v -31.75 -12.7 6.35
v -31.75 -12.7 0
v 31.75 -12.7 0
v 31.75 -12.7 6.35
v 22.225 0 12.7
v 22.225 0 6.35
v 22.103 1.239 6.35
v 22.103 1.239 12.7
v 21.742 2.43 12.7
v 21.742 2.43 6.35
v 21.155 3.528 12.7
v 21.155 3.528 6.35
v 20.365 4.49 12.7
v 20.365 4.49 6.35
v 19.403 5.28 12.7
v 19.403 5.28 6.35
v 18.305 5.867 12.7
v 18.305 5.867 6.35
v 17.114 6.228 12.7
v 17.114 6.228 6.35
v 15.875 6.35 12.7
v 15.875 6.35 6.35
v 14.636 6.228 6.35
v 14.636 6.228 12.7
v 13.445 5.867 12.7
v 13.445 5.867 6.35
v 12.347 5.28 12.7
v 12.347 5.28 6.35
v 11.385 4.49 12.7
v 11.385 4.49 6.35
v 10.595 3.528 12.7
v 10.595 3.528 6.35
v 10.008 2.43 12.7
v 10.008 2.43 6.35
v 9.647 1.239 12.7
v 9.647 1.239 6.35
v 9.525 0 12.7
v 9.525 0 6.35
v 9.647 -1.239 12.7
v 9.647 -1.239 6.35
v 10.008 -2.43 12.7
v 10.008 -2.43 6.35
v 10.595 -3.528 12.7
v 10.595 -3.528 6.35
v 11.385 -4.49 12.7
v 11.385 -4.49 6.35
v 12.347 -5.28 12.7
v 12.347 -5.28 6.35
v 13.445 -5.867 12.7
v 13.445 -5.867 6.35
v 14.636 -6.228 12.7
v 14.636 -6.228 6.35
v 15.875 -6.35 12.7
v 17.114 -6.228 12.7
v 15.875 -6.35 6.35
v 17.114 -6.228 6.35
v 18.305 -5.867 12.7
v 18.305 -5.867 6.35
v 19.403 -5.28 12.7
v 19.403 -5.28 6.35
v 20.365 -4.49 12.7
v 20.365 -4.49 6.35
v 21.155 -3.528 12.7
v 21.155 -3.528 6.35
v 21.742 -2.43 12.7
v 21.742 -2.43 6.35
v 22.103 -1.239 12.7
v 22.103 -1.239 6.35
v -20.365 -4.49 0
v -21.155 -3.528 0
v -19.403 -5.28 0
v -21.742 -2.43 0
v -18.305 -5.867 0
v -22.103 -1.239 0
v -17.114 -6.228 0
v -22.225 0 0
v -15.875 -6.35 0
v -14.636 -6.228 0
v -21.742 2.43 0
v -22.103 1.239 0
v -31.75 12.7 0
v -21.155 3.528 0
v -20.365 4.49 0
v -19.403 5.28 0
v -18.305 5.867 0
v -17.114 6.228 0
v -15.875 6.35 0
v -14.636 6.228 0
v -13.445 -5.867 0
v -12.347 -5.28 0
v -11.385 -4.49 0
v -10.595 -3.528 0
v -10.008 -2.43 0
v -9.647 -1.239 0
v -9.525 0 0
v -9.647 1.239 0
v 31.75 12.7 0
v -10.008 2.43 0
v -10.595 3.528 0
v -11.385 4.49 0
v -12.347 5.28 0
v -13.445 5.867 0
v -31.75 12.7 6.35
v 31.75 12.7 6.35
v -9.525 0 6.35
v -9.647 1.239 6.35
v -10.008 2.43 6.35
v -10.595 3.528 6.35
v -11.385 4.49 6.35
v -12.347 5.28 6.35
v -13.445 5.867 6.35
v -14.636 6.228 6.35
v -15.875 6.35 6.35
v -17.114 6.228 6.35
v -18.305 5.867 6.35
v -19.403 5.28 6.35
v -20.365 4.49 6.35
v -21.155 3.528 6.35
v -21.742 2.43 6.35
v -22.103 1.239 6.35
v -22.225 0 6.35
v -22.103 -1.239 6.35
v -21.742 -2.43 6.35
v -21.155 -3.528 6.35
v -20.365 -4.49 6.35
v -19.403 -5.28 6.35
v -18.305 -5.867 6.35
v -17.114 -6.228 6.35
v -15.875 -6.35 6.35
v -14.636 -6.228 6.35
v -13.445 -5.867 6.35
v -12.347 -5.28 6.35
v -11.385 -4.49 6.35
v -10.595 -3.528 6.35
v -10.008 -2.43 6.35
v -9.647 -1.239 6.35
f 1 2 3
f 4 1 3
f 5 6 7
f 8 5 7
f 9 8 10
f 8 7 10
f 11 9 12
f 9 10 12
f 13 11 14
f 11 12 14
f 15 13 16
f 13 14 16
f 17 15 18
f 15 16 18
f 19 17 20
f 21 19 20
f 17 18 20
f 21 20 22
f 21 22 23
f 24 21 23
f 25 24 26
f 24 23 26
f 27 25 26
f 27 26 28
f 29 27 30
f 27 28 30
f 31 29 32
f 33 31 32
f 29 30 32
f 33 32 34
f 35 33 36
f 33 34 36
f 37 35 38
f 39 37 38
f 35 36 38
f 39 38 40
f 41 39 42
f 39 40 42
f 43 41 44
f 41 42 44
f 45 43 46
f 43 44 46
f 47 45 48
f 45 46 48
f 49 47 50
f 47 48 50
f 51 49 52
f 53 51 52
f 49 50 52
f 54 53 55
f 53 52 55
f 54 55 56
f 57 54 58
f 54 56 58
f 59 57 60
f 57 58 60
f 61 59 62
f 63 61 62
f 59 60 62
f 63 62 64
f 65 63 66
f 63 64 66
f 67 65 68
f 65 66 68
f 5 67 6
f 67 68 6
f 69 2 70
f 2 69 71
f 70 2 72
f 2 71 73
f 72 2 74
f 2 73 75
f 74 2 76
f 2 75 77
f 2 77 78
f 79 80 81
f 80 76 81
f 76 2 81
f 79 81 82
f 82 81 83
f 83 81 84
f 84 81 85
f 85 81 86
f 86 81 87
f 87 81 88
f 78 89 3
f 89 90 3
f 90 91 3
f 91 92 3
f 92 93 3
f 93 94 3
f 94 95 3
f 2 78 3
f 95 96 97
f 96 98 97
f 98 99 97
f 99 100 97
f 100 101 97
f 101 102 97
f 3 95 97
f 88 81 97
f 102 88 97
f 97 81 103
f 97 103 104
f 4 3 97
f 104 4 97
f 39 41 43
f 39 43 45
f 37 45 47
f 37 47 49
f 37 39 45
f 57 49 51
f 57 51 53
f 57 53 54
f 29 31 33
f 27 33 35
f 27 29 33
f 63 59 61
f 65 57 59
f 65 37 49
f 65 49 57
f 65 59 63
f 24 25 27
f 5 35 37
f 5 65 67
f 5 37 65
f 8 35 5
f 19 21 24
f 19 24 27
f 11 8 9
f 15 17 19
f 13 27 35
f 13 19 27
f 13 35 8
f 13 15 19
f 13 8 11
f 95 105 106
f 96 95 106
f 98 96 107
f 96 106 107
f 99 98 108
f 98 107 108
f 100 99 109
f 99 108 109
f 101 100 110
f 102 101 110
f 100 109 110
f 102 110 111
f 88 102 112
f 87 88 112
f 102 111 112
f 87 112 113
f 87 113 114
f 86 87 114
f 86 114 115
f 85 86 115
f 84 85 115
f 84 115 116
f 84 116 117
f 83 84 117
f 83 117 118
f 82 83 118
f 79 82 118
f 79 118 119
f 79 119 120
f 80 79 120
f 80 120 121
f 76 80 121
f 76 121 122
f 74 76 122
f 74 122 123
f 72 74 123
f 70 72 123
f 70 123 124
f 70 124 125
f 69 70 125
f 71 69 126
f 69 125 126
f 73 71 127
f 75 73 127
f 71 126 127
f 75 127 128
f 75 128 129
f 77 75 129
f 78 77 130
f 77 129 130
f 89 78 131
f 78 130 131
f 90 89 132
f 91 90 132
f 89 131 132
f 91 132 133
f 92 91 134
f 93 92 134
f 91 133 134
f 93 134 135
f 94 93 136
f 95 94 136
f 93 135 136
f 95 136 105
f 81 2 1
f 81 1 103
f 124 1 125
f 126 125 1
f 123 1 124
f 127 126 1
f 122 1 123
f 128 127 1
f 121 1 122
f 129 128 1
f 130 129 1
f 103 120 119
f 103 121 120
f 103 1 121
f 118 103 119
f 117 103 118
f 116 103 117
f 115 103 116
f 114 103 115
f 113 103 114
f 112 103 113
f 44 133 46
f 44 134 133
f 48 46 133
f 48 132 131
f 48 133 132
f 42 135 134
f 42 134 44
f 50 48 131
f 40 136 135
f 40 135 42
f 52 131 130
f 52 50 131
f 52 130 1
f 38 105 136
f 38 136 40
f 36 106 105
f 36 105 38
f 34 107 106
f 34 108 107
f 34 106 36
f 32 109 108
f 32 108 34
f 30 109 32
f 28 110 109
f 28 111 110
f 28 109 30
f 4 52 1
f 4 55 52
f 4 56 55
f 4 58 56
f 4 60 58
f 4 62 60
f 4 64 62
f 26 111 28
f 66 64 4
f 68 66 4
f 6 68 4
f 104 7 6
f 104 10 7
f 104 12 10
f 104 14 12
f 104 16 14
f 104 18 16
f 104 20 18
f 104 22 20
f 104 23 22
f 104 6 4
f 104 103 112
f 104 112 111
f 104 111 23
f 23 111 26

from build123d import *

# Parameters (mm, degrees)
F0_W     = 63.5
F0_H     = 25.4
F1_DEPTH = 6.35
F2_R     = 6.35
F3_DEPTH = 6.351
F4_R     = 6.35
F5_DEPTH = 6.35


with BuildPart() as f1:
    # F0 (on Top) → F1 (new body)
    with BuildSketch(Plane.XY):
        Rectangle(F0_W, F0_H)
    extrude(amount=F1_DEPTH)

    # F2 (on face) → F3 (cut, through all)
    with BuildSketch(Plane.XY.offset(6.35)):
        with Locations((-15.875, 0)):
            Circle(F2_R)
    extrude(amount=-F3_DEPTH, mode=Mode.SUBTRACT)

    # F4 (on face) → F5 (join)
    with BuildSketch(Plane.XY.offset(6.35)):
        with Locations((15.875, 0)):
            Circle(F4_R)
    extrude(amount=F5_DEPTH)


solid = f1.part
